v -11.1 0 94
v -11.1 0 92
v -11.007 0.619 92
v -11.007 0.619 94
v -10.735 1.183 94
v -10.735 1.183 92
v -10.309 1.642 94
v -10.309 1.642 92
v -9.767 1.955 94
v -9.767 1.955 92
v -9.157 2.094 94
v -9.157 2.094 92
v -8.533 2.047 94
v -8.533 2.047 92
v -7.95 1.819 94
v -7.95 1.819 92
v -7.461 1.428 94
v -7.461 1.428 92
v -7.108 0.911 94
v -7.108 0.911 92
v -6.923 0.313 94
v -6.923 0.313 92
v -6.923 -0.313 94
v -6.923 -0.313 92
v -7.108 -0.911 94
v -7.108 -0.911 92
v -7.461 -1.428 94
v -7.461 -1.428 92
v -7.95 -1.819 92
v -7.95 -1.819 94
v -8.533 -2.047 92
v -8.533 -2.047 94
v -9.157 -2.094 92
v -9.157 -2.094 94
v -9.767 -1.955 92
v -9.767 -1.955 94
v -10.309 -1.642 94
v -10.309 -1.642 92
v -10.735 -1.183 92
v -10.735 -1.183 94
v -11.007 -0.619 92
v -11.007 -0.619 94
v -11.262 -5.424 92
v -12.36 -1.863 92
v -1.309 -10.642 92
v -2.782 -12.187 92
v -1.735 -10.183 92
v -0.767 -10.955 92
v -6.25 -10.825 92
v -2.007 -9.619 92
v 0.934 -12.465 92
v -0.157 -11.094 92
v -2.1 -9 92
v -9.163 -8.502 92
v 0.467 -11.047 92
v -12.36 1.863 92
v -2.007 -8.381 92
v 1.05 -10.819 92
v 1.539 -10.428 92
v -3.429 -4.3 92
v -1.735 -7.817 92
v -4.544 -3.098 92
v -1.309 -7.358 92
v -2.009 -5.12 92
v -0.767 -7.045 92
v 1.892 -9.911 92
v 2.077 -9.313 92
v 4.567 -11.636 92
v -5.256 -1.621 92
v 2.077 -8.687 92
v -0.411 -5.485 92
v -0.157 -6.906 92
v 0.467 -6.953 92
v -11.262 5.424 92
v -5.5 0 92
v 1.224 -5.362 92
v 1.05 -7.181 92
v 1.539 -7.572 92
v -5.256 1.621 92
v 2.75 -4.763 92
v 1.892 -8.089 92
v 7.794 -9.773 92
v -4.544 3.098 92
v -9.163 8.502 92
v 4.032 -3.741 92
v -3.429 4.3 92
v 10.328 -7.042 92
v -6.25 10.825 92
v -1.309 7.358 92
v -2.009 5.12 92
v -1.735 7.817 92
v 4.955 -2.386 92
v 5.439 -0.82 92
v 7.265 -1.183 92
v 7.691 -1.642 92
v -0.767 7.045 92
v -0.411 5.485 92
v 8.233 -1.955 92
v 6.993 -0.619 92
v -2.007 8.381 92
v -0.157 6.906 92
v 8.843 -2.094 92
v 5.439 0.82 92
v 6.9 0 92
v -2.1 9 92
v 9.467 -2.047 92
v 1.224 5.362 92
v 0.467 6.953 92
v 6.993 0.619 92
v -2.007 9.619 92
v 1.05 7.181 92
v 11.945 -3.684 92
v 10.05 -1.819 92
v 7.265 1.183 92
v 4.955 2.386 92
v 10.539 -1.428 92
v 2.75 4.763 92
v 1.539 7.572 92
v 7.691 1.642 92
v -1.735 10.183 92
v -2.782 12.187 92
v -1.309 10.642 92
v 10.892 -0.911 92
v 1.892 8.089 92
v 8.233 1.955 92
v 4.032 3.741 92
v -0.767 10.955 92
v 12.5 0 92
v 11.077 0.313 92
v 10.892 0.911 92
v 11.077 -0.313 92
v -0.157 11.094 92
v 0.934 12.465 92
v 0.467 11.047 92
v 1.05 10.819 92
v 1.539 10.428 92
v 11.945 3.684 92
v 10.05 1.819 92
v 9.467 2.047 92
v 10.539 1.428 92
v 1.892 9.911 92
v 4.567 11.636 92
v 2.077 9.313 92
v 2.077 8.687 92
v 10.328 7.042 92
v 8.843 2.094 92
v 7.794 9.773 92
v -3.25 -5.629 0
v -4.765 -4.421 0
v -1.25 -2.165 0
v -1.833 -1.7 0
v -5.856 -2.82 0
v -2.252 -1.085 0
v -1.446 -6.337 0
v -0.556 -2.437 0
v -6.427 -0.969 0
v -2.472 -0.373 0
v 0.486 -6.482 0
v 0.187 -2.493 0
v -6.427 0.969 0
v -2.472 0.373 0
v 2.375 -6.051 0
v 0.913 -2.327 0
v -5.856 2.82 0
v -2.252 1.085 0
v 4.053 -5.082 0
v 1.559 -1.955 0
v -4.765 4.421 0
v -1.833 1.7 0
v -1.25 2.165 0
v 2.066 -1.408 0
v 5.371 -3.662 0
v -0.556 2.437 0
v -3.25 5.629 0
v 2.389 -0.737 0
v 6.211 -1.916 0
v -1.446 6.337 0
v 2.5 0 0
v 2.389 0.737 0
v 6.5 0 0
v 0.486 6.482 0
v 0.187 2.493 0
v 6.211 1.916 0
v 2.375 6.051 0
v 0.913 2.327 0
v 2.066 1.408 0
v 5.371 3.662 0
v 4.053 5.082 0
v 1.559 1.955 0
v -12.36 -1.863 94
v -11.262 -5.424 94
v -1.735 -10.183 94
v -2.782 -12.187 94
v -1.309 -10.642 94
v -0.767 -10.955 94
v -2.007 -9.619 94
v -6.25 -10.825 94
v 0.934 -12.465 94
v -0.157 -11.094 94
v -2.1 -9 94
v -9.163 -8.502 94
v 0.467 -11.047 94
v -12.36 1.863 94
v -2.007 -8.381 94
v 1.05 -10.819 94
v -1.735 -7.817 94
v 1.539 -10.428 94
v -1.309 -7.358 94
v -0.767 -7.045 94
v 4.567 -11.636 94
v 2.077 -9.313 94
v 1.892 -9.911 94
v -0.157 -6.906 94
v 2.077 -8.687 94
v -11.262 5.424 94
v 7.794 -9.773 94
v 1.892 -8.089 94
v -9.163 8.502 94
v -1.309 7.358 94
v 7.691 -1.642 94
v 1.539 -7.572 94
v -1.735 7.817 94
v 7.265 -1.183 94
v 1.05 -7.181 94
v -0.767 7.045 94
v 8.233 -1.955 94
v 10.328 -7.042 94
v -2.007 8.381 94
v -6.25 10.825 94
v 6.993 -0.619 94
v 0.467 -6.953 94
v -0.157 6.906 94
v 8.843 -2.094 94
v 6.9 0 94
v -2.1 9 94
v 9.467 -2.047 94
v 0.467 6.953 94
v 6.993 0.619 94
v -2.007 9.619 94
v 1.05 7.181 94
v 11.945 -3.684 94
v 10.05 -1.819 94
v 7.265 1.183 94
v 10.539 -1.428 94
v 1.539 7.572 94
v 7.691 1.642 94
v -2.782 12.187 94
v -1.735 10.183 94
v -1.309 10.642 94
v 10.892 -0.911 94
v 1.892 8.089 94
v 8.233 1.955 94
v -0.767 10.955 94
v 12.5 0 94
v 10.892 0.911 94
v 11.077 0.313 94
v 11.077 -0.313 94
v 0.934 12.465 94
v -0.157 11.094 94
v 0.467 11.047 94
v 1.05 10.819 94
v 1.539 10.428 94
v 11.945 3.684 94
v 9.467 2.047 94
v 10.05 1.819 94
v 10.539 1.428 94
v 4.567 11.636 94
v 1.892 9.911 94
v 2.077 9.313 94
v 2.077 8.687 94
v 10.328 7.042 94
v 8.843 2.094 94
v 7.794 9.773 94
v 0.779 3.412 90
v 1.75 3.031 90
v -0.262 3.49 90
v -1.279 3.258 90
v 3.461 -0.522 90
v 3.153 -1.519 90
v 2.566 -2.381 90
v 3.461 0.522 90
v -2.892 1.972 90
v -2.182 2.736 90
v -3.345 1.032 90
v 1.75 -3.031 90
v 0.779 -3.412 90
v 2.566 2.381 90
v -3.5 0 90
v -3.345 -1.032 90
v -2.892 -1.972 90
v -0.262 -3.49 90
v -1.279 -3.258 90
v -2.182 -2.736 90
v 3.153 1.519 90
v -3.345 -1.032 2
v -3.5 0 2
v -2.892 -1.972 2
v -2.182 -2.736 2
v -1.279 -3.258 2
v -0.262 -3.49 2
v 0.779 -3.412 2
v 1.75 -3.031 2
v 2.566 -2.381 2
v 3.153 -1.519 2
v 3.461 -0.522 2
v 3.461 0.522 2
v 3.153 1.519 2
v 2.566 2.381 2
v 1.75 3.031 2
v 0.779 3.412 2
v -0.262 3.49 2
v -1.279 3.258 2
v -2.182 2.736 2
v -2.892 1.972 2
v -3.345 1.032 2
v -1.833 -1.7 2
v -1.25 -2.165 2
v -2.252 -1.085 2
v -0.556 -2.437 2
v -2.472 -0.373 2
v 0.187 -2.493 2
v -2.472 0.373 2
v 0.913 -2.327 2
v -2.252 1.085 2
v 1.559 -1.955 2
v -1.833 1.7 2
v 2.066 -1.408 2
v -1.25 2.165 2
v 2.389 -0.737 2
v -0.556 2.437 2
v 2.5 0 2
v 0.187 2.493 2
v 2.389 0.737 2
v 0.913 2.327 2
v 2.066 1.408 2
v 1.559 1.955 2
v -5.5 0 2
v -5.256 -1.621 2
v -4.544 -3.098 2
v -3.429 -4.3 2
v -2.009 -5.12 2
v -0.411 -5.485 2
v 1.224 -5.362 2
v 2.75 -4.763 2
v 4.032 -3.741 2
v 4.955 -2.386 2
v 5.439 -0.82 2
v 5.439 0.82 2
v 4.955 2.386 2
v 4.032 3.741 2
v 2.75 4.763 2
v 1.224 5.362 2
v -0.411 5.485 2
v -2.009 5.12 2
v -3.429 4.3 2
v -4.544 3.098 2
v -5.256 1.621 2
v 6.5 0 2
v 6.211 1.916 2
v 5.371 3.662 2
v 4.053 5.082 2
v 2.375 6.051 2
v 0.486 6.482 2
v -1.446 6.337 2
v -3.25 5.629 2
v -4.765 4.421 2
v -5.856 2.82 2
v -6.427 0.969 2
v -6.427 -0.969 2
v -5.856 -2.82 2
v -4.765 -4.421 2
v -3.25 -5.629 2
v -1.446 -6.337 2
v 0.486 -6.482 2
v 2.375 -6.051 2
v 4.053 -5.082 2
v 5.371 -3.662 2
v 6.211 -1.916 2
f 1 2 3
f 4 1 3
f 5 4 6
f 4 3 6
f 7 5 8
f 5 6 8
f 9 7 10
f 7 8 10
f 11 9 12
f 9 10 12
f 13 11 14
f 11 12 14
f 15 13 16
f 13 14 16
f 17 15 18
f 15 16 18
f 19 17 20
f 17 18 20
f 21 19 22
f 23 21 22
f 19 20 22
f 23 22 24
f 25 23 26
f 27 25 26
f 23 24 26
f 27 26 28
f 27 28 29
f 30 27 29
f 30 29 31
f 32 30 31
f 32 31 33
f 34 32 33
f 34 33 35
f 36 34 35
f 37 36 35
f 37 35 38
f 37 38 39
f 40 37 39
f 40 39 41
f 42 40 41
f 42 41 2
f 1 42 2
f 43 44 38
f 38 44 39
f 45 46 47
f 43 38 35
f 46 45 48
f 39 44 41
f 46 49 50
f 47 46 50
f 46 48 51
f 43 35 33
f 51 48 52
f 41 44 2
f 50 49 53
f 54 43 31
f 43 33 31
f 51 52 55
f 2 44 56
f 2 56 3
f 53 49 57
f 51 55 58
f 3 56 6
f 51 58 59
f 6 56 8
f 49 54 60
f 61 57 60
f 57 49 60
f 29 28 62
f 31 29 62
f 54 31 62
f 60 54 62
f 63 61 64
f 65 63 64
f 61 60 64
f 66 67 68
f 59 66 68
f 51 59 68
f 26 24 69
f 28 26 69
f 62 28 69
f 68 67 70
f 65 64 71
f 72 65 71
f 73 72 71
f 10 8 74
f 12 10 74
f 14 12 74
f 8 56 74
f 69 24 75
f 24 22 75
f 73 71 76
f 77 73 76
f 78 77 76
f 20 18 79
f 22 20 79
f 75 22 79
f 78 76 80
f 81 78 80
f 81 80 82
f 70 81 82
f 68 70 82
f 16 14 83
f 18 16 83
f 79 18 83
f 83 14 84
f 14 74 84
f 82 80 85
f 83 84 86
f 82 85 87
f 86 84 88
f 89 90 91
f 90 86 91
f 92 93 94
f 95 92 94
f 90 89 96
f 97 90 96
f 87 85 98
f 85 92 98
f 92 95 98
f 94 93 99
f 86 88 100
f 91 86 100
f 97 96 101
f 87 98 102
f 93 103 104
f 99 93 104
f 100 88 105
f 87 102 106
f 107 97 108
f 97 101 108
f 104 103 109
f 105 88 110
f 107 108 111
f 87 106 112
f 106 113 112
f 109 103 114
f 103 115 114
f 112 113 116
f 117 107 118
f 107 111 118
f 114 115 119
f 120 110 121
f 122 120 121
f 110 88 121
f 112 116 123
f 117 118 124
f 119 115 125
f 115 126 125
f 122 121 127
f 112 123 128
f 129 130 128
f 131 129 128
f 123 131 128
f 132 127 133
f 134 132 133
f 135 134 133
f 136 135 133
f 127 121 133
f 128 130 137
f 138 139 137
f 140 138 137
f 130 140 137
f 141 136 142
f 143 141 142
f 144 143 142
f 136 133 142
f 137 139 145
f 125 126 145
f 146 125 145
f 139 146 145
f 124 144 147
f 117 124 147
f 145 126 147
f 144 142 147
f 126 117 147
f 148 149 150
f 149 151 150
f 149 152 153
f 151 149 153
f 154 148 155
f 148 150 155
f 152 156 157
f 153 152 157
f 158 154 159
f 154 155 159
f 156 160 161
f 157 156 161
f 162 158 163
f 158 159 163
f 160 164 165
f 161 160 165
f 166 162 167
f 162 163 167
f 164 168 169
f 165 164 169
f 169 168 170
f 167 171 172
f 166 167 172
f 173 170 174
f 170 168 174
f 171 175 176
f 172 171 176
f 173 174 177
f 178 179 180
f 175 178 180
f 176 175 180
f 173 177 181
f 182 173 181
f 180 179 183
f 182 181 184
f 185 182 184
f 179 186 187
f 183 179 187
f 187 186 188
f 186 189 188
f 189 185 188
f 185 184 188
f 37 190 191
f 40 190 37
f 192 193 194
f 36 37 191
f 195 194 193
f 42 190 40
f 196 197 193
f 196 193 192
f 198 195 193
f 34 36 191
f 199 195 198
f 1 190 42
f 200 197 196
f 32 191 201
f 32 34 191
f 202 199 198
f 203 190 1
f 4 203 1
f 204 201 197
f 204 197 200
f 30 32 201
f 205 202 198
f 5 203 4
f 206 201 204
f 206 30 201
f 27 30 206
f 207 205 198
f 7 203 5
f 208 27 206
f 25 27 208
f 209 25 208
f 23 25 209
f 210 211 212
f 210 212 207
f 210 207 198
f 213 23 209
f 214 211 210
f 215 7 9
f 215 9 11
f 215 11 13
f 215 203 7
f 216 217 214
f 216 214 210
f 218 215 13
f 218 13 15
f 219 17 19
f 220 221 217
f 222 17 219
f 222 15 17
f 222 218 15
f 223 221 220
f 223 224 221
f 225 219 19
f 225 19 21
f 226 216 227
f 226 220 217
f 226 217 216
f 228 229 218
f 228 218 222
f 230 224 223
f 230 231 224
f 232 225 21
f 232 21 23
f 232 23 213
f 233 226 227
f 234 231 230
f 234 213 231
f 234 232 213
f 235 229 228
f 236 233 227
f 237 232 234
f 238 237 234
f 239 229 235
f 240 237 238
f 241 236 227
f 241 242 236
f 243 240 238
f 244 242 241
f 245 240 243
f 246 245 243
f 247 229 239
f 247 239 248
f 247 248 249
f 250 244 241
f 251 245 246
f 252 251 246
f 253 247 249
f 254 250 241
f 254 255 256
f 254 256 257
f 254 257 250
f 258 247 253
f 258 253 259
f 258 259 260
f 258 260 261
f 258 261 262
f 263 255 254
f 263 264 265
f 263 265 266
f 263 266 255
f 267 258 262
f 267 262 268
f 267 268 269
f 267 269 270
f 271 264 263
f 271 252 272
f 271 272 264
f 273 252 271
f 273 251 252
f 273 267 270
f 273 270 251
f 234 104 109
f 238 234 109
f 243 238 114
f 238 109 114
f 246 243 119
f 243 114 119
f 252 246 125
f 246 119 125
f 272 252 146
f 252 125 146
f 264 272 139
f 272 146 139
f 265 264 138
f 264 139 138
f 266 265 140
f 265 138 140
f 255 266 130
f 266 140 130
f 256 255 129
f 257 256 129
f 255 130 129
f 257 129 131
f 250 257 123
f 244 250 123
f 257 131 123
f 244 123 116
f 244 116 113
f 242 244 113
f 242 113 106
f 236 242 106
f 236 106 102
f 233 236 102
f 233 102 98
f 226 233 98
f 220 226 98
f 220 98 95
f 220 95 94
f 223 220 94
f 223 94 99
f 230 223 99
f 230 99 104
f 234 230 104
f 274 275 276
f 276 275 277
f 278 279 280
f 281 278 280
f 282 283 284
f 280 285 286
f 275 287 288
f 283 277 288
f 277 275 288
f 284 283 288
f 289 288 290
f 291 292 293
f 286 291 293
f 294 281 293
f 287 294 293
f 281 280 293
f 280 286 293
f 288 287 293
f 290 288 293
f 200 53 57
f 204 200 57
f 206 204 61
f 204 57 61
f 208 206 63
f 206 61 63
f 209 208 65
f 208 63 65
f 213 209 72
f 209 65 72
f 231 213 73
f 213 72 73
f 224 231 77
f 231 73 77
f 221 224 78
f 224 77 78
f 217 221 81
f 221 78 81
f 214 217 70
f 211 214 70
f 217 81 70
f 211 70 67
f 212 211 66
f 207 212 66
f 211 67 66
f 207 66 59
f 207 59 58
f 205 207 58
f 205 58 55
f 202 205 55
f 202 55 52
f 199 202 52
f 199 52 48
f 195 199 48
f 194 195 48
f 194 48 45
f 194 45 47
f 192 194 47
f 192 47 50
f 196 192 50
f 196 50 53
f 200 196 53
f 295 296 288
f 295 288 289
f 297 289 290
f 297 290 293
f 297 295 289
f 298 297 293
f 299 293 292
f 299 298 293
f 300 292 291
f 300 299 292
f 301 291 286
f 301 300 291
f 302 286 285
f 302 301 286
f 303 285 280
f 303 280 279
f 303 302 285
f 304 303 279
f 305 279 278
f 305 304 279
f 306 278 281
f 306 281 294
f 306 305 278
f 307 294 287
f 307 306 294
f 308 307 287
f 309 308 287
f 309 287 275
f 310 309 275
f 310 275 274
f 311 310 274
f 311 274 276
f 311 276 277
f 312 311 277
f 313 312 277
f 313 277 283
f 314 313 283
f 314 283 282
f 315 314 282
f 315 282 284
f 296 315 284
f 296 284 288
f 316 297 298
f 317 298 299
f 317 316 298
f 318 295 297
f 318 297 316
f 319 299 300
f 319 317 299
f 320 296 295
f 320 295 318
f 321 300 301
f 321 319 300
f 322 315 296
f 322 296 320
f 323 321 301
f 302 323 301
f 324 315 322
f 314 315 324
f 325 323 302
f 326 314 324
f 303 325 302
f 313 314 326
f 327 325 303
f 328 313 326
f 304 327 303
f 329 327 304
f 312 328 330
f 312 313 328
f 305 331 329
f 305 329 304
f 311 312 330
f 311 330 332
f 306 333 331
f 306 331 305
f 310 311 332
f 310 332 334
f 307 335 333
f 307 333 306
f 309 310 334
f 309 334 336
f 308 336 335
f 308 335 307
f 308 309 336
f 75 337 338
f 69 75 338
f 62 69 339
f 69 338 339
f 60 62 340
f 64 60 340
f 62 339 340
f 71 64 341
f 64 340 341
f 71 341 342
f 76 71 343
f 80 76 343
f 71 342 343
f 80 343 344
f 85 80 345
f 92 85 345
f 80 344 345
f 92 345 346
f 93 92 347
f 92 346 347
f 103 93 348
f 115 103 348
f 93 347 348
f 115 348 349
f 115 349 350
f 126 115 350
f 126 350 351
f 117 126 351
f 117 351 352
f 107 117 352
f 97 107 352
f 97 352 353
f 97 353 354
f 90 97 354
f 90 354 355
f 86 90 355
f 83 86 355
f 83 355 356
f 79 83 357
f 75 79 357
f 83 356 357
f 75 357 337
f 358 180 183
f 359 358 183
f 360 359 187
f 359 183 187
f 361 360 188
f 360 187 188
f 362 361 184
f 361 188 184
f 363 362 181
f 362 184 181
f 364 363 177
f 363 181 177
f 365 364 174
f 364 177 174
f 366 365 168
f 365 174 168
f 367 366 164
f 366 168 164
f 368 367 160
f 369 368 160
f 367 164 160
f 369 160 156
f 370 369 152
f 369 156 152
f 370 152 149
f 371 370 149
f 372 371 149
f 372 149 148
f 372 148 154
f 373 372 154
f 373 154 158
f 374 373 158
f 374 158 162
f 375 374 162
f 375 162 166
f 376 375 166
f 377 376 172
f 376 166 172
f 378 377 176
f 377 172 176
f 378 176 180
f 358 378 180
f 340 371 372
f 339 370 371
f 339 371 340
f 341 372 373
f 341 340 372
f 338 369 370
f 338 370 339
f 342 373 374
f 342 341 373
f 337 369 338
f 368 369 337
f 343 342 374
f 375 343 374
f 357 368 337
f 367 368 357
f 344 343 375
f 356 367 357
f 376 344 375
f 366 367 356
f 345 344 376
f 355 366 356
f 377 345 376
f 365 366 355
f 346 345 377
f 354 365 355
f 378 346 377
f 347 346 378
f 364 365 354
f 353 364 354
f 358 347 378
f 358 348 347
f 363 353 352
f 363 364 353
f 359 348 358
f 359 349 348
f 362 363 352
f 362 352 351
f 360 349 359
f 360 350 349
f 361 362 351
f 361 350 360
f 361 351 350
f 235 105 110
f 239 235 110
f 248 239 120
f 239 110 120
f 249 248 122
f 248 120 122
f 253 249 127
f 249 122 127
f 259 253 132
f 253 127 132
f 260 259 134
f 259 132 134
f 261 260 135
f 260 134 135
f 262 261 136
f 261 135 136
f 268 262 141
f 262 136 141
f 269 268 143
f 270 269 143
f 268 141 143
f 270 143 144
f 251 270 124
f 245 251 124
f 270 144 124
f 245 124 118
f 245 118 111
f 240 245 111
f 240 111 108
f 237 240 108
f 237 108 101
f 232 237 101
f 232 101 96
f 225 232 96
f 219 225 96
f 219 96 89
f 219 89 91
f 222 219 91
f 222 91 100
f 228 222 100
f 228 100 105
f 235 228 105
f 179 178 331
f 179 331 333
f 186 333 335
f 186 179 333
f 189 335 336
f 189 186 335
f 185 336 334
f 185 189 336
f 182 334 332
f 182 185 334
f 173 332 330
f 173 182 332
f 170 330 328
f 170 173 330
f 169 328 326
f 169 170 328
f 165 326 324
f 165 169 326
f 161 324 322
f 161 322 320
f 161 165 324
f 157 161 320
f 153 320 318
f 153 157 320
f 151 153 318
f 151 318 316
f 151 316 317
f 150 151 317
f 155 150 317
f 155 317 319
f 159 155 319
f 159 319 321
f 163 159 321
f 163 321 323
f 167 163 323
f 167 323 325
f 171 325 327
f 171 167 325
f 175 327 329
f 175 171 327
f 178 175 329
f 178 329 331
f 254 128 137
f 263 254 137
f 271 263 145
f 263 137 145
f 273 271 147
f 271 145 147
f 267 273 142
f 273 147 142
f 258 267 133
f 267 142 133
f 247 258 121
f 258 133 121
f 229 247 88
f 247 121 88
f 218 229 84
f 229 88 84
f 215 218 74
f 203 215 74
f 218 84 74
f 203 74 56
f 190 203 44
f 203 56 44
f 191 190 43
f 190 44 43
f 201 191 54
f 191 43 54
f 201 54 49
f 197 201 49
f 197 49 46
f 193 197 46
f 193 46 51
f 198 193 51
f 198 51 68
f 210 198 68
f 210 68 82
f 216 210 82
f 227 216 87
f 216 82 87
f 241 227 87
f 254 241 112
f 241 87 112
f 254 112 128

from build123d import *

# Parameters (mm, degrees)
SKETCH1_R           = 6.5
SKETCH1_R_2         = 2.5
BOSS_EXTRUDE1_DEPTH = 2
SKETCH2_R           = 5.5
SKETCH2_R_2         = 3.5
BOSS_EXTRUDE2_DEPTH = 90
BOSS_EXTRUDE3_START = -2
SKETCH4_R           = 3.5
BOSS_EXTRUDE3_DEPTH = 2
SKETCH5_R           = 12.5
BOSS_EXTRUDE4_DEPTH = 2
SKETCH6_R           = 2.1
CUT_EXTRUDE1_DEPTH  = 10


with BuildPart() as part:
    # Sketch1 → Boss-Extrude1 (new body)
    with BuildSketch(Plane.XY):
        Circle(SKETCH1_R)
        Circle(SKETCH1_R_2, mode=Mode.SUBTRACT)
    extrude(amount=BOSS_EXTRUDE1_DEPTH)

    # Sketch2 → Boss-Extrude2 (add)
    with BuildSketch(Plane.XY.offset(2)):
        with Locations(Location((0, 0, 0), (0, 0, 180))):
            Circle(SKETCH2_R)
        with Locations(Location((0, 0, 0), (0, 0, 180))):
            Circle(SKETCH2_R_2, mode=Mode.SUBTRACT)
    extrude(amount=BOSS_EXTRUDE2_DEPTH)

    # Sketch4 → Boss-Extrude3 (add)
    with BuildSketch(Plane.XY.offset(92).offset(BOSS_EXTRUDE3_START)):
        with Locations(Location((0, 0, 0), (0, 0, 180))):
            Circle(SKETCH4_R)
    extrude(amount=BOSS_EXTRUDE3_DEPTH)

    # Sketch5 → Boss-Extrude4 (add)
    with BuildSketch(Plane.XY.offset(92)):
        Circle(SKETCH5_R)
    extrude(amount=BOSS_EXTRUDE4_DEPTH)

    # Sketch6 → Cut-Extrude1 (cut)
    with BuildSketch(Plane(origin=(0, 0, 92), x_dir=(-1, 0, 0), z_dir=(0, 0, -1))):
        with Locations((0, 9)):
            Circle(SKETCH6_R)
        with Locations((9, 0)):
            Circle(SKETCH6_R)
        with Locations((0, -9)):
            Circle(SKETCH6_R)
        with Locations((-9, 0)):
            Circle(SKETCH6_R)
    extrude(amount=-CUT_EXTRUDE1_DEPTH, mode=Mode.SUBTRACT)


solid = part.part
